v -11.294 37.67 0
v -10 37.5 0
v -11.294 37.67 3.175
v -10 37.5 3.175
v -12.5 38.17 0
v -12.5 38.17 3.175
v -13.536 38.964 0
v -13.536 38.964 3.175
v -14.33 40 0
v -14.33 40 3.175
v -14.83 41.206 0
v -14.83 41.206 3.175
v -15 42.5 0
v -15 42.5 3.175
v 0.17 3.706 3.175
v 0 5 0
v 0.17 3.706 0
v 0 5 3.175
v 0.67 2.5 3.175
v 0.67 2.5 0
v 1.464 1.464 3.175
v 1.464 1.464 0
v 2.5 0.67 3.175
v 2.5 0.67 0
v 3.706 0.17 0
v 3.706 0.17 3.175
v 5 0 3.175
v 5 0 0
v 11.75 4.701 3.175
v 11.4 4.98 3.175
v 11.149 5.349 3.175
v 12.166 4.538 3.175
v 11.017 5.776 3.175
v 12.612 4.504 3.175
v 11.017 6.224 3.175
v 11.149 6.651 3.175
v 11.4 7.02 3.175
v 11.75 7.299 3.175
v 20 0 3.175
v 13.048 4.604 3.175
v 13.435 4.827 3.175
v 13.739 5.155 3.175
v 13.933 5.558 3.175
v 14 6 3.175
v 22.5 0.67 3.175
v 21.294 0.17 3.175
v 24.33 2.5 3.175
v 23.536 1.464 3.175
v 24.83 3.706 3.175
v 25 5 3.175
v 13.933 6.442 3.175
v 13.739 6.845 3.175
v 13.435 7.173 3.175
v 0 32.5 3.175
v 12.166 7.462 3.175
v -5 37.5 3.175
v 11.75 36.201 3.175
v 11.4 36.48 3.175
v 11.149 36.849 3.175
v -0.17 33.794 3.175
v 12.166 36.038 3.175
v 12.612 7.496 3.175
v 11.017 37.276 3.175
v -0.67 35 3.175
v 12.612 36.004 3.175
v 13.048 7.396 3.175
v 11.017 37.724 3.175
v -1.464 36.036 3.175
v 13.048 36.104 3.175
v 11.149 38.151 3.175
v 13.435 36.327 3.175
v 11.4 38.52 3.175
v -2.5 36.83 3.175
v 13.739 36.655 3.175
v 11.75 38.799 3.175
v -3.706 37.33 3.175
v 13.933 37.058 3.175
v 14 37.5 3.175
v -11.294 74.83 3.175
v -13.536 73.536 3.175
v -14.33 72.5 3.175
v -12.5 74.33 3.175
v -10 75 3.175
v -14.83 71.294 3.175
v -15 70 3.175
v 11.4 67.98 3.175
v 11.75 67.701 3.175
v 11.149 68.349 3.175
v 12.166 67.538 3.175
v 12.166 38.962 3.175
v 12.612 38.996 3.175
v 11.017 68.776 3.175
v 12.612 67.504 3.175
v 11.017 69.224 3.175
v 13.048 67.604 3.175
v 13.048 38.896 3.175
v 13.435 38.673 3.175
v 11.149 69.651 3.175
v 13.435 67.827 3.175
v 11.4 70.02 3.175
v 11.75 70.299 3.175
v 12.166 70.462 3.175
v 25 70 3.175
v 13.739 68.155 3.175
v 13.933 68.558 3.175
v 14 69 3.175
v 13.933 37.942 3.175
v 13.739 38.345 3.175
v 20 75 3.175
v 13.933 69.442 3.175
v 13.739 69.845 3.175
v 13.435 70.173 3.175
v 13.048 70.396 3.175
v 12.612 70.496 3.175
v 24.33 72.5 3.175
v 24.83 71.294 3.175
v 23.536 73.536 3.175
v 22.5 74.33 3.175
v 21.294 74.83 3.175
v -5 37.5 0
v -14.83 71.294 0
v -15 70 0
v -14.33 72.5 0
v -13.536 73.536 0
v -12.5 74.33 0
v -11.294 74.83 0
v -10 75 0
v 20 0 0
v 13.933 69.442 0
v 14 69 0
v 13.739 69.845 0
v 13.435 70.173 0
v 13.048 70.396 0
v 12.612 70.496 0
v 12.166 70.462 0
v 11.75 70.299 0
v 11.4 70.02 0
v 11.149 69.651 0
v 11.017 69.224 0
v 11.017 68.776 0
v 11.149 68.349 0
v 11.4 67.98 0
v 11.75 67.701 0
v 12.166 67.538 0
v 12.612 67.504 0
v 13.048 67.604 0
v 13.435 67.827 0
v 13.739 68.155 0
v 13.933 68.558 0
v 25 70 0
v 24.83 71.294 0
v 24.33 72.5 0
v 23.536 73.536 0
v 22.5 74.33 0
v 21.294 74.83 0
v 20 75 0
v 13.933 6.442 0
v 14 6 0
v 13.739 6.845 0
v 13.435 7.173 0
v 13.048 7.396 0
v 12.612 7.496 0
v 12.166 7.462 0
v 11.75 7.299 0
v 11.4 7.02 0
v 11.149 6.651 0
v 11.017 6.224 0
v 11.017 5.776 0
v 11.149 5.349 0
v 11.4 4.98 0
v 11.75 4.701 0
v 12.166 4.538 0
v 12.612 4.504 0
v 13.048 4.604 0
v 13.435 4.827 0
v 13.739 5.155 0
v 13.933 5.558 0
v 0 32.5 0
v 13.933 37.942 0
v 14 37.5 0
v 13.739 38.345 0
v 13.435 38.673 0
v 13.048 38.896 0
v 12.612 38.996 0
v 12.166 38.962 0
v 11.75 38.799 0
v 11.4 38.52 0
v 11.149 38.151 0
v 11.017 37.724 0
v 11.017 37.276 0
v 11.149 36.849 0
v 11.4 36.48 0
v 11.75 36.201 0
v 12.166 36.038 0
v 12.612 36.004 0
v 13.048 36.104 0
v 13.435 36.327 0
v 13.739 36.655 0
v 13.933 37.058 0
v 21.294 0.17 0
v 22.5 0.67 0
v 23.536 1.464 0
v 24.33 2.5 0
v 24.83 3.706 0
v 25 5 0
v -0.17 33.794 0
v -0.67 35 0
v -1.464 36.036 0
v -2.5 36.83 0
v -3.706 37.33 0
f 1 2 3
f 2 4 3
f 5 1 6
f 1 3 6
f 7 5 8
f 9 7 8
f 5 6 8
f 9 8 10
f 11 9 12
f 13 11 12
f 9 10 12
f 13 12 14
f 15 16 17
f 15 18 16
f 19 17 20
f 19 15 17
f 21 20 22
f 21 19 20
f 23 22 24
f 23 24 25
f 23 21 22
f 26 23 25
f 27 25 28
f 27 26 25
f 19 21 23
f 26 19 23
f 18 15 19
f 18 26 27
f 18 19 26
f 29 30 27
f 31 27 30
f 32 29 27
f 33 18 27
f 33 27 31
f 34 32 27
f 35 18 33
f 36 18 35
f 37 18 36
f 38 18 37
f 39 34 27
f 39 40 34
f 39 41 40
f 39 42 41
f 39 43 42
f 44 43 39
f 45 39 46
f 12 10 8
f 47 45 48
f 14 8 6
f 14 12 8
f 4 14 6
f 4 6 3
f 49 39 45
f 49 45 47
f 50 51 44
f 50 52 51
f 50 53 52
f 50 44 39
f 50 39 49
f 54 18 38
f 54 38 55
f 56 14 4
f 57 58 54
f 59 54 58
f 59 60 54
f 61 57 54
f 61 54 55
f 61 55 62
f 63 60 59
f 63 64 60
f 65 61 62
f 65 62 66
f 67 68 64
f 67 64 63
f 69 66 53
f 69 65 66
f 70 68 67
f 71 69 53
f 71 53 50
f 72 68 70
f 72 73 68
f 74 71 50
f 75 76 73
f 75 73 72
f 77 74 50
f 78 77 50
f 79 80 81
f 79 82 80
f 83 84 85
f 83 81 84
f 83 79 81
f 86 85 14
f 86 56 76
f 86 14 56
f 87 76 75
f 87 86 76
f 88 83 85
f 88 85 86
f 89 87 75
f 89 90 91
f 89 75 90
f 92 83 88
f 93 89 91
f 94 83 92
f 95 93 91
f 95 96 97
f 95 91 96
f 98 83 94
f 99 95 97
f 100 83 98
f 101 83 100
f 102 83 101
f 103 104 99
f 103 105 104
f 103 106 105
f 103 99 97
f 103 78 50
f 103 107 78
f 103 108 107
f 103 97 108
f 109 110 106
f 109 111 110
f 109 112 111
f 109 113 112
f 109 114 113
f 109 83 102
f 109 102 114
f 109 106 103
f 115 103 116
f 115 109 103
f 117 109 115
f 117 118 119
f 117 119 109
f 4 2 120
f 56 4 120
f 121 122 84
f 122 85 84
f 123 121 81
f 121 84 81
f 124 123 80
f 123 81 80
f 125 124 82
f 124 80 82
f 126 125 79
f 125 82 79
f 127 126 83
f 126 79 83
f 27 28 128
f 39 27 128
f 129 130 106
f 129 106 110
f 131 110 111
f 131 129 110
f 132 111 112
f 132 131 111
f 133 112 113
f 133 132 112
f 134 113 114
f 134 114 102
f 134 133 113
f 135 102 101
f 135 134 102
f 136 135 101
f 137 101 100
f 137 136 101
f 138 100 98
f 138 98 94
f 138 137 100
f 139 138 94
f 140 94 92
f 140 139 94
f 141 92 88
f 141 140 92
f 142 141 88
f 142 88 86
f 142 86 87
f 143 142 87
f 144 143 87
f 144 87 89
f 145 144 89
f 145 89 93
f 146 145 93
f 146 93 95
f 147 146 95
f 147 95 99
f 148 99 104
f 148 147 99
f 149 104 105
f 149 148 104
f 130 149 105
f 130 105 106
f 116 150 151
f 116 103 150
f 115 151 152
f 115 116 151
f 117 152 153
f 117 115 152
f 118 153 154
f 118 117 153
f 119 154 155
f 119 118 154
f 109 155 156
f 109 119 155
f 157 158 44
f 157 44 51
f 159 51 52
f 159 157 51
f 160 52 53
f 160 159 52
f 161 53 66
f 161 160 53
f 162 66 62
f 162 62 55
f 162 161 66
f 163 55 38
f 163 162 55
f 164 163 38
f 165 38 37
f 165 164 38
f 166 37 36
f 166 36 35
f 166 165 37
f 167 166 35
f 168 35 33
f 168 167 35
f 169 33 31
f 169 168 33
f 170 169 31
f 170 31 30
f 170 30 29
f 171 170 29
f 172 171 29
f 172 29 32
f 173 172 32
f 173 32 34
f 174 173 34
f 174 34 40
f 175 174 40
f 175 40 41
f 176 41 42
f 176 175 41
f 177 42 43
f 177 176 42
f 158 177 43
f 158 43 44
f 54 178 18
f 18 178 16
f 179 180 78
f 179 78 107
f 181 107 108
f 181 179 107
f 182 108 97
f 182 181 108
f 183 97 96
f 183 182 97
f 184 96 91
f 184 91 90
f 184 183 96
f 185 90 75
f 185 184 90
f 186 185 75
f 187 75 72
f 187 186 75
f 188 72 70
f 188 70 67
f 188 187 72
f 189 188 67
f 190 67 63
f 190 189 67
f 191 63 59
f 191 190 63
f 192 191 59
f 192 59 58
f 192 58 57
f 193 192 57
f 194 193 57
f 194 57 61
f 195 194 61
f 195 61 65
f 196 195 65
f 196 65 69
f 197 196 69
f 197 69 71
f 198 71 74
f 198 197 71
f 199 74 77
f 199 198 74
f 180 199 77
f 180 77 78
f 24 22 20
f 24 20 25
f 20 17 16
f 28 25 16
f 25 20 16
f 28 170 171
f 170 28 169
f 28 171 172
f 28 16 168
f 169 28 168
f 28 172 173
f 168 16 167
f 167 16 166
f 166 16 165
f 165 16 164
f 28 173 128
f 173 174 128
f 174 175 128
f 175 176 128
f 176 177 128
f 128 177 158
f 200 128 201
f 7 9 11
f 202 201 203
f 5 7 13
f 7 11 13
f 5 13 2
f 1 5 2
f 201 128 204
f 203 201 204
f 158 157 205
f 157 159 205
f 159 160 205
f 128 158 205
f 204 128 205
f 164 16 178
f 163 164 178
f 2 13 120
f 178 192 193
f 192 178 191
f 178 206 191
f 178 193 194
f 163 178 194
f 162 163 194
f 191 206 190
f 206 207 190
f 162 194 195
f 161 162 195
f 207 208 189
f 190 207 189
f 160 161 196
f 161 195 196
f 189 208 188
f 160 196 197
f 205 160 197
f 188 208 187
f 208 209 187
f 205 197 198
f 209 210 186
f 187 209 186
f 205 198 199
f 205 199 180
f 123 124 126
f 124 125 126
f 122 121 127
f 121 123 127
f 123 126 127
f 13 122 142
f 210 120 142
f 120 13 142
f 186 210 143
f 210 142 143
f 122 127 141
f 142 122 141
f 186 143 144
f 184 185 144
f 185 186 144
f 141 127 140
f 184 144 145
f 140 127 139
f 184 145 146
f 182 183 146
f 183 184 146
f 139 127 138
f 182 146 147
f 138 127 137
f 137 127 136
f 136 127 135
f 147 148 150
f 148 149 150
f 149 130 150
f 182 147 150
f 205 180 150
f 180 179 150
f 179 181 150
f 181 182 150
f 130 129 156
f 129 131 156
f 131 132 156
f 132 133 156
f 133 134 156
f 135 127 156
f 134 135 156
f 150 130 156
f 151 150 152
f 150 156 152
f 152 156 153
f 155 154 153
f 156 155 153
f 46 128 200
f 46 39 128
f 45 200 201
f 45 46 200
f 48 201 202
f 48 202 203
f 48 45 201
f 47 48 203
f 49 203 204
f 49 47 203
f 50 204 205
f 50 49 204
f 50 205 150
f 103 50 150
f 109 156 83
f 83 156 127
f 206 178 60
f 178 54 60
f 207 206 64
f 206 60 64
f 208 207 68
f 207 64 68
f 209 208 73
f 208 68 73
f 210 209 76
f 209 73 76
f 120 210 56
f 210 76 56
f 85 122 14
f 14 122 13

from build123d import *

# Parameters (mm, degrees)
SKETCH1_R           = 1.5
BOSS_EXTRUDE1_DEPTH = 3.175
FILLET1_R           = 5


with BuildPart() as part:
    # Sketch1 → Boss-Extrude1 (new body)
    with BuildSketch(Plane.XY):
        Polygon((0, 37.5), (0, 0), (25, 0), (25, 75), (-15, 75), (-15, 37.5), align=None)
        with Locations((12.5, 6)):
            Circle(SKETCH1_R, mode=Mode.SUBTRACT)
        with Locations((12.5, 37.5)):
            Circle(SKETCH1_R, mode=Mode.SUBTRACT)
        with Locations((12.5, 69)):
            Circle(SKETCH1_R, mode=Mode.SUBTRACT)
    extrude(amount=BOSS_EXTRUDE1_DEPTH)

    # Fillet1
    fillet1_edges = [part.edges().sort_by_distance(p)[0] for p in [
        (25, 75, 1.5875),
        (25, 0, 1.5875),
        (0, 0, 1.5875),
        (0, 37.5, 1.5875),
        (-15, 37.5, 1.5875),
        (-15, 75, 1.5875),
    ]]
    fillet(fillet1_edges, radius=FILLET1_R)


solid = part.part
